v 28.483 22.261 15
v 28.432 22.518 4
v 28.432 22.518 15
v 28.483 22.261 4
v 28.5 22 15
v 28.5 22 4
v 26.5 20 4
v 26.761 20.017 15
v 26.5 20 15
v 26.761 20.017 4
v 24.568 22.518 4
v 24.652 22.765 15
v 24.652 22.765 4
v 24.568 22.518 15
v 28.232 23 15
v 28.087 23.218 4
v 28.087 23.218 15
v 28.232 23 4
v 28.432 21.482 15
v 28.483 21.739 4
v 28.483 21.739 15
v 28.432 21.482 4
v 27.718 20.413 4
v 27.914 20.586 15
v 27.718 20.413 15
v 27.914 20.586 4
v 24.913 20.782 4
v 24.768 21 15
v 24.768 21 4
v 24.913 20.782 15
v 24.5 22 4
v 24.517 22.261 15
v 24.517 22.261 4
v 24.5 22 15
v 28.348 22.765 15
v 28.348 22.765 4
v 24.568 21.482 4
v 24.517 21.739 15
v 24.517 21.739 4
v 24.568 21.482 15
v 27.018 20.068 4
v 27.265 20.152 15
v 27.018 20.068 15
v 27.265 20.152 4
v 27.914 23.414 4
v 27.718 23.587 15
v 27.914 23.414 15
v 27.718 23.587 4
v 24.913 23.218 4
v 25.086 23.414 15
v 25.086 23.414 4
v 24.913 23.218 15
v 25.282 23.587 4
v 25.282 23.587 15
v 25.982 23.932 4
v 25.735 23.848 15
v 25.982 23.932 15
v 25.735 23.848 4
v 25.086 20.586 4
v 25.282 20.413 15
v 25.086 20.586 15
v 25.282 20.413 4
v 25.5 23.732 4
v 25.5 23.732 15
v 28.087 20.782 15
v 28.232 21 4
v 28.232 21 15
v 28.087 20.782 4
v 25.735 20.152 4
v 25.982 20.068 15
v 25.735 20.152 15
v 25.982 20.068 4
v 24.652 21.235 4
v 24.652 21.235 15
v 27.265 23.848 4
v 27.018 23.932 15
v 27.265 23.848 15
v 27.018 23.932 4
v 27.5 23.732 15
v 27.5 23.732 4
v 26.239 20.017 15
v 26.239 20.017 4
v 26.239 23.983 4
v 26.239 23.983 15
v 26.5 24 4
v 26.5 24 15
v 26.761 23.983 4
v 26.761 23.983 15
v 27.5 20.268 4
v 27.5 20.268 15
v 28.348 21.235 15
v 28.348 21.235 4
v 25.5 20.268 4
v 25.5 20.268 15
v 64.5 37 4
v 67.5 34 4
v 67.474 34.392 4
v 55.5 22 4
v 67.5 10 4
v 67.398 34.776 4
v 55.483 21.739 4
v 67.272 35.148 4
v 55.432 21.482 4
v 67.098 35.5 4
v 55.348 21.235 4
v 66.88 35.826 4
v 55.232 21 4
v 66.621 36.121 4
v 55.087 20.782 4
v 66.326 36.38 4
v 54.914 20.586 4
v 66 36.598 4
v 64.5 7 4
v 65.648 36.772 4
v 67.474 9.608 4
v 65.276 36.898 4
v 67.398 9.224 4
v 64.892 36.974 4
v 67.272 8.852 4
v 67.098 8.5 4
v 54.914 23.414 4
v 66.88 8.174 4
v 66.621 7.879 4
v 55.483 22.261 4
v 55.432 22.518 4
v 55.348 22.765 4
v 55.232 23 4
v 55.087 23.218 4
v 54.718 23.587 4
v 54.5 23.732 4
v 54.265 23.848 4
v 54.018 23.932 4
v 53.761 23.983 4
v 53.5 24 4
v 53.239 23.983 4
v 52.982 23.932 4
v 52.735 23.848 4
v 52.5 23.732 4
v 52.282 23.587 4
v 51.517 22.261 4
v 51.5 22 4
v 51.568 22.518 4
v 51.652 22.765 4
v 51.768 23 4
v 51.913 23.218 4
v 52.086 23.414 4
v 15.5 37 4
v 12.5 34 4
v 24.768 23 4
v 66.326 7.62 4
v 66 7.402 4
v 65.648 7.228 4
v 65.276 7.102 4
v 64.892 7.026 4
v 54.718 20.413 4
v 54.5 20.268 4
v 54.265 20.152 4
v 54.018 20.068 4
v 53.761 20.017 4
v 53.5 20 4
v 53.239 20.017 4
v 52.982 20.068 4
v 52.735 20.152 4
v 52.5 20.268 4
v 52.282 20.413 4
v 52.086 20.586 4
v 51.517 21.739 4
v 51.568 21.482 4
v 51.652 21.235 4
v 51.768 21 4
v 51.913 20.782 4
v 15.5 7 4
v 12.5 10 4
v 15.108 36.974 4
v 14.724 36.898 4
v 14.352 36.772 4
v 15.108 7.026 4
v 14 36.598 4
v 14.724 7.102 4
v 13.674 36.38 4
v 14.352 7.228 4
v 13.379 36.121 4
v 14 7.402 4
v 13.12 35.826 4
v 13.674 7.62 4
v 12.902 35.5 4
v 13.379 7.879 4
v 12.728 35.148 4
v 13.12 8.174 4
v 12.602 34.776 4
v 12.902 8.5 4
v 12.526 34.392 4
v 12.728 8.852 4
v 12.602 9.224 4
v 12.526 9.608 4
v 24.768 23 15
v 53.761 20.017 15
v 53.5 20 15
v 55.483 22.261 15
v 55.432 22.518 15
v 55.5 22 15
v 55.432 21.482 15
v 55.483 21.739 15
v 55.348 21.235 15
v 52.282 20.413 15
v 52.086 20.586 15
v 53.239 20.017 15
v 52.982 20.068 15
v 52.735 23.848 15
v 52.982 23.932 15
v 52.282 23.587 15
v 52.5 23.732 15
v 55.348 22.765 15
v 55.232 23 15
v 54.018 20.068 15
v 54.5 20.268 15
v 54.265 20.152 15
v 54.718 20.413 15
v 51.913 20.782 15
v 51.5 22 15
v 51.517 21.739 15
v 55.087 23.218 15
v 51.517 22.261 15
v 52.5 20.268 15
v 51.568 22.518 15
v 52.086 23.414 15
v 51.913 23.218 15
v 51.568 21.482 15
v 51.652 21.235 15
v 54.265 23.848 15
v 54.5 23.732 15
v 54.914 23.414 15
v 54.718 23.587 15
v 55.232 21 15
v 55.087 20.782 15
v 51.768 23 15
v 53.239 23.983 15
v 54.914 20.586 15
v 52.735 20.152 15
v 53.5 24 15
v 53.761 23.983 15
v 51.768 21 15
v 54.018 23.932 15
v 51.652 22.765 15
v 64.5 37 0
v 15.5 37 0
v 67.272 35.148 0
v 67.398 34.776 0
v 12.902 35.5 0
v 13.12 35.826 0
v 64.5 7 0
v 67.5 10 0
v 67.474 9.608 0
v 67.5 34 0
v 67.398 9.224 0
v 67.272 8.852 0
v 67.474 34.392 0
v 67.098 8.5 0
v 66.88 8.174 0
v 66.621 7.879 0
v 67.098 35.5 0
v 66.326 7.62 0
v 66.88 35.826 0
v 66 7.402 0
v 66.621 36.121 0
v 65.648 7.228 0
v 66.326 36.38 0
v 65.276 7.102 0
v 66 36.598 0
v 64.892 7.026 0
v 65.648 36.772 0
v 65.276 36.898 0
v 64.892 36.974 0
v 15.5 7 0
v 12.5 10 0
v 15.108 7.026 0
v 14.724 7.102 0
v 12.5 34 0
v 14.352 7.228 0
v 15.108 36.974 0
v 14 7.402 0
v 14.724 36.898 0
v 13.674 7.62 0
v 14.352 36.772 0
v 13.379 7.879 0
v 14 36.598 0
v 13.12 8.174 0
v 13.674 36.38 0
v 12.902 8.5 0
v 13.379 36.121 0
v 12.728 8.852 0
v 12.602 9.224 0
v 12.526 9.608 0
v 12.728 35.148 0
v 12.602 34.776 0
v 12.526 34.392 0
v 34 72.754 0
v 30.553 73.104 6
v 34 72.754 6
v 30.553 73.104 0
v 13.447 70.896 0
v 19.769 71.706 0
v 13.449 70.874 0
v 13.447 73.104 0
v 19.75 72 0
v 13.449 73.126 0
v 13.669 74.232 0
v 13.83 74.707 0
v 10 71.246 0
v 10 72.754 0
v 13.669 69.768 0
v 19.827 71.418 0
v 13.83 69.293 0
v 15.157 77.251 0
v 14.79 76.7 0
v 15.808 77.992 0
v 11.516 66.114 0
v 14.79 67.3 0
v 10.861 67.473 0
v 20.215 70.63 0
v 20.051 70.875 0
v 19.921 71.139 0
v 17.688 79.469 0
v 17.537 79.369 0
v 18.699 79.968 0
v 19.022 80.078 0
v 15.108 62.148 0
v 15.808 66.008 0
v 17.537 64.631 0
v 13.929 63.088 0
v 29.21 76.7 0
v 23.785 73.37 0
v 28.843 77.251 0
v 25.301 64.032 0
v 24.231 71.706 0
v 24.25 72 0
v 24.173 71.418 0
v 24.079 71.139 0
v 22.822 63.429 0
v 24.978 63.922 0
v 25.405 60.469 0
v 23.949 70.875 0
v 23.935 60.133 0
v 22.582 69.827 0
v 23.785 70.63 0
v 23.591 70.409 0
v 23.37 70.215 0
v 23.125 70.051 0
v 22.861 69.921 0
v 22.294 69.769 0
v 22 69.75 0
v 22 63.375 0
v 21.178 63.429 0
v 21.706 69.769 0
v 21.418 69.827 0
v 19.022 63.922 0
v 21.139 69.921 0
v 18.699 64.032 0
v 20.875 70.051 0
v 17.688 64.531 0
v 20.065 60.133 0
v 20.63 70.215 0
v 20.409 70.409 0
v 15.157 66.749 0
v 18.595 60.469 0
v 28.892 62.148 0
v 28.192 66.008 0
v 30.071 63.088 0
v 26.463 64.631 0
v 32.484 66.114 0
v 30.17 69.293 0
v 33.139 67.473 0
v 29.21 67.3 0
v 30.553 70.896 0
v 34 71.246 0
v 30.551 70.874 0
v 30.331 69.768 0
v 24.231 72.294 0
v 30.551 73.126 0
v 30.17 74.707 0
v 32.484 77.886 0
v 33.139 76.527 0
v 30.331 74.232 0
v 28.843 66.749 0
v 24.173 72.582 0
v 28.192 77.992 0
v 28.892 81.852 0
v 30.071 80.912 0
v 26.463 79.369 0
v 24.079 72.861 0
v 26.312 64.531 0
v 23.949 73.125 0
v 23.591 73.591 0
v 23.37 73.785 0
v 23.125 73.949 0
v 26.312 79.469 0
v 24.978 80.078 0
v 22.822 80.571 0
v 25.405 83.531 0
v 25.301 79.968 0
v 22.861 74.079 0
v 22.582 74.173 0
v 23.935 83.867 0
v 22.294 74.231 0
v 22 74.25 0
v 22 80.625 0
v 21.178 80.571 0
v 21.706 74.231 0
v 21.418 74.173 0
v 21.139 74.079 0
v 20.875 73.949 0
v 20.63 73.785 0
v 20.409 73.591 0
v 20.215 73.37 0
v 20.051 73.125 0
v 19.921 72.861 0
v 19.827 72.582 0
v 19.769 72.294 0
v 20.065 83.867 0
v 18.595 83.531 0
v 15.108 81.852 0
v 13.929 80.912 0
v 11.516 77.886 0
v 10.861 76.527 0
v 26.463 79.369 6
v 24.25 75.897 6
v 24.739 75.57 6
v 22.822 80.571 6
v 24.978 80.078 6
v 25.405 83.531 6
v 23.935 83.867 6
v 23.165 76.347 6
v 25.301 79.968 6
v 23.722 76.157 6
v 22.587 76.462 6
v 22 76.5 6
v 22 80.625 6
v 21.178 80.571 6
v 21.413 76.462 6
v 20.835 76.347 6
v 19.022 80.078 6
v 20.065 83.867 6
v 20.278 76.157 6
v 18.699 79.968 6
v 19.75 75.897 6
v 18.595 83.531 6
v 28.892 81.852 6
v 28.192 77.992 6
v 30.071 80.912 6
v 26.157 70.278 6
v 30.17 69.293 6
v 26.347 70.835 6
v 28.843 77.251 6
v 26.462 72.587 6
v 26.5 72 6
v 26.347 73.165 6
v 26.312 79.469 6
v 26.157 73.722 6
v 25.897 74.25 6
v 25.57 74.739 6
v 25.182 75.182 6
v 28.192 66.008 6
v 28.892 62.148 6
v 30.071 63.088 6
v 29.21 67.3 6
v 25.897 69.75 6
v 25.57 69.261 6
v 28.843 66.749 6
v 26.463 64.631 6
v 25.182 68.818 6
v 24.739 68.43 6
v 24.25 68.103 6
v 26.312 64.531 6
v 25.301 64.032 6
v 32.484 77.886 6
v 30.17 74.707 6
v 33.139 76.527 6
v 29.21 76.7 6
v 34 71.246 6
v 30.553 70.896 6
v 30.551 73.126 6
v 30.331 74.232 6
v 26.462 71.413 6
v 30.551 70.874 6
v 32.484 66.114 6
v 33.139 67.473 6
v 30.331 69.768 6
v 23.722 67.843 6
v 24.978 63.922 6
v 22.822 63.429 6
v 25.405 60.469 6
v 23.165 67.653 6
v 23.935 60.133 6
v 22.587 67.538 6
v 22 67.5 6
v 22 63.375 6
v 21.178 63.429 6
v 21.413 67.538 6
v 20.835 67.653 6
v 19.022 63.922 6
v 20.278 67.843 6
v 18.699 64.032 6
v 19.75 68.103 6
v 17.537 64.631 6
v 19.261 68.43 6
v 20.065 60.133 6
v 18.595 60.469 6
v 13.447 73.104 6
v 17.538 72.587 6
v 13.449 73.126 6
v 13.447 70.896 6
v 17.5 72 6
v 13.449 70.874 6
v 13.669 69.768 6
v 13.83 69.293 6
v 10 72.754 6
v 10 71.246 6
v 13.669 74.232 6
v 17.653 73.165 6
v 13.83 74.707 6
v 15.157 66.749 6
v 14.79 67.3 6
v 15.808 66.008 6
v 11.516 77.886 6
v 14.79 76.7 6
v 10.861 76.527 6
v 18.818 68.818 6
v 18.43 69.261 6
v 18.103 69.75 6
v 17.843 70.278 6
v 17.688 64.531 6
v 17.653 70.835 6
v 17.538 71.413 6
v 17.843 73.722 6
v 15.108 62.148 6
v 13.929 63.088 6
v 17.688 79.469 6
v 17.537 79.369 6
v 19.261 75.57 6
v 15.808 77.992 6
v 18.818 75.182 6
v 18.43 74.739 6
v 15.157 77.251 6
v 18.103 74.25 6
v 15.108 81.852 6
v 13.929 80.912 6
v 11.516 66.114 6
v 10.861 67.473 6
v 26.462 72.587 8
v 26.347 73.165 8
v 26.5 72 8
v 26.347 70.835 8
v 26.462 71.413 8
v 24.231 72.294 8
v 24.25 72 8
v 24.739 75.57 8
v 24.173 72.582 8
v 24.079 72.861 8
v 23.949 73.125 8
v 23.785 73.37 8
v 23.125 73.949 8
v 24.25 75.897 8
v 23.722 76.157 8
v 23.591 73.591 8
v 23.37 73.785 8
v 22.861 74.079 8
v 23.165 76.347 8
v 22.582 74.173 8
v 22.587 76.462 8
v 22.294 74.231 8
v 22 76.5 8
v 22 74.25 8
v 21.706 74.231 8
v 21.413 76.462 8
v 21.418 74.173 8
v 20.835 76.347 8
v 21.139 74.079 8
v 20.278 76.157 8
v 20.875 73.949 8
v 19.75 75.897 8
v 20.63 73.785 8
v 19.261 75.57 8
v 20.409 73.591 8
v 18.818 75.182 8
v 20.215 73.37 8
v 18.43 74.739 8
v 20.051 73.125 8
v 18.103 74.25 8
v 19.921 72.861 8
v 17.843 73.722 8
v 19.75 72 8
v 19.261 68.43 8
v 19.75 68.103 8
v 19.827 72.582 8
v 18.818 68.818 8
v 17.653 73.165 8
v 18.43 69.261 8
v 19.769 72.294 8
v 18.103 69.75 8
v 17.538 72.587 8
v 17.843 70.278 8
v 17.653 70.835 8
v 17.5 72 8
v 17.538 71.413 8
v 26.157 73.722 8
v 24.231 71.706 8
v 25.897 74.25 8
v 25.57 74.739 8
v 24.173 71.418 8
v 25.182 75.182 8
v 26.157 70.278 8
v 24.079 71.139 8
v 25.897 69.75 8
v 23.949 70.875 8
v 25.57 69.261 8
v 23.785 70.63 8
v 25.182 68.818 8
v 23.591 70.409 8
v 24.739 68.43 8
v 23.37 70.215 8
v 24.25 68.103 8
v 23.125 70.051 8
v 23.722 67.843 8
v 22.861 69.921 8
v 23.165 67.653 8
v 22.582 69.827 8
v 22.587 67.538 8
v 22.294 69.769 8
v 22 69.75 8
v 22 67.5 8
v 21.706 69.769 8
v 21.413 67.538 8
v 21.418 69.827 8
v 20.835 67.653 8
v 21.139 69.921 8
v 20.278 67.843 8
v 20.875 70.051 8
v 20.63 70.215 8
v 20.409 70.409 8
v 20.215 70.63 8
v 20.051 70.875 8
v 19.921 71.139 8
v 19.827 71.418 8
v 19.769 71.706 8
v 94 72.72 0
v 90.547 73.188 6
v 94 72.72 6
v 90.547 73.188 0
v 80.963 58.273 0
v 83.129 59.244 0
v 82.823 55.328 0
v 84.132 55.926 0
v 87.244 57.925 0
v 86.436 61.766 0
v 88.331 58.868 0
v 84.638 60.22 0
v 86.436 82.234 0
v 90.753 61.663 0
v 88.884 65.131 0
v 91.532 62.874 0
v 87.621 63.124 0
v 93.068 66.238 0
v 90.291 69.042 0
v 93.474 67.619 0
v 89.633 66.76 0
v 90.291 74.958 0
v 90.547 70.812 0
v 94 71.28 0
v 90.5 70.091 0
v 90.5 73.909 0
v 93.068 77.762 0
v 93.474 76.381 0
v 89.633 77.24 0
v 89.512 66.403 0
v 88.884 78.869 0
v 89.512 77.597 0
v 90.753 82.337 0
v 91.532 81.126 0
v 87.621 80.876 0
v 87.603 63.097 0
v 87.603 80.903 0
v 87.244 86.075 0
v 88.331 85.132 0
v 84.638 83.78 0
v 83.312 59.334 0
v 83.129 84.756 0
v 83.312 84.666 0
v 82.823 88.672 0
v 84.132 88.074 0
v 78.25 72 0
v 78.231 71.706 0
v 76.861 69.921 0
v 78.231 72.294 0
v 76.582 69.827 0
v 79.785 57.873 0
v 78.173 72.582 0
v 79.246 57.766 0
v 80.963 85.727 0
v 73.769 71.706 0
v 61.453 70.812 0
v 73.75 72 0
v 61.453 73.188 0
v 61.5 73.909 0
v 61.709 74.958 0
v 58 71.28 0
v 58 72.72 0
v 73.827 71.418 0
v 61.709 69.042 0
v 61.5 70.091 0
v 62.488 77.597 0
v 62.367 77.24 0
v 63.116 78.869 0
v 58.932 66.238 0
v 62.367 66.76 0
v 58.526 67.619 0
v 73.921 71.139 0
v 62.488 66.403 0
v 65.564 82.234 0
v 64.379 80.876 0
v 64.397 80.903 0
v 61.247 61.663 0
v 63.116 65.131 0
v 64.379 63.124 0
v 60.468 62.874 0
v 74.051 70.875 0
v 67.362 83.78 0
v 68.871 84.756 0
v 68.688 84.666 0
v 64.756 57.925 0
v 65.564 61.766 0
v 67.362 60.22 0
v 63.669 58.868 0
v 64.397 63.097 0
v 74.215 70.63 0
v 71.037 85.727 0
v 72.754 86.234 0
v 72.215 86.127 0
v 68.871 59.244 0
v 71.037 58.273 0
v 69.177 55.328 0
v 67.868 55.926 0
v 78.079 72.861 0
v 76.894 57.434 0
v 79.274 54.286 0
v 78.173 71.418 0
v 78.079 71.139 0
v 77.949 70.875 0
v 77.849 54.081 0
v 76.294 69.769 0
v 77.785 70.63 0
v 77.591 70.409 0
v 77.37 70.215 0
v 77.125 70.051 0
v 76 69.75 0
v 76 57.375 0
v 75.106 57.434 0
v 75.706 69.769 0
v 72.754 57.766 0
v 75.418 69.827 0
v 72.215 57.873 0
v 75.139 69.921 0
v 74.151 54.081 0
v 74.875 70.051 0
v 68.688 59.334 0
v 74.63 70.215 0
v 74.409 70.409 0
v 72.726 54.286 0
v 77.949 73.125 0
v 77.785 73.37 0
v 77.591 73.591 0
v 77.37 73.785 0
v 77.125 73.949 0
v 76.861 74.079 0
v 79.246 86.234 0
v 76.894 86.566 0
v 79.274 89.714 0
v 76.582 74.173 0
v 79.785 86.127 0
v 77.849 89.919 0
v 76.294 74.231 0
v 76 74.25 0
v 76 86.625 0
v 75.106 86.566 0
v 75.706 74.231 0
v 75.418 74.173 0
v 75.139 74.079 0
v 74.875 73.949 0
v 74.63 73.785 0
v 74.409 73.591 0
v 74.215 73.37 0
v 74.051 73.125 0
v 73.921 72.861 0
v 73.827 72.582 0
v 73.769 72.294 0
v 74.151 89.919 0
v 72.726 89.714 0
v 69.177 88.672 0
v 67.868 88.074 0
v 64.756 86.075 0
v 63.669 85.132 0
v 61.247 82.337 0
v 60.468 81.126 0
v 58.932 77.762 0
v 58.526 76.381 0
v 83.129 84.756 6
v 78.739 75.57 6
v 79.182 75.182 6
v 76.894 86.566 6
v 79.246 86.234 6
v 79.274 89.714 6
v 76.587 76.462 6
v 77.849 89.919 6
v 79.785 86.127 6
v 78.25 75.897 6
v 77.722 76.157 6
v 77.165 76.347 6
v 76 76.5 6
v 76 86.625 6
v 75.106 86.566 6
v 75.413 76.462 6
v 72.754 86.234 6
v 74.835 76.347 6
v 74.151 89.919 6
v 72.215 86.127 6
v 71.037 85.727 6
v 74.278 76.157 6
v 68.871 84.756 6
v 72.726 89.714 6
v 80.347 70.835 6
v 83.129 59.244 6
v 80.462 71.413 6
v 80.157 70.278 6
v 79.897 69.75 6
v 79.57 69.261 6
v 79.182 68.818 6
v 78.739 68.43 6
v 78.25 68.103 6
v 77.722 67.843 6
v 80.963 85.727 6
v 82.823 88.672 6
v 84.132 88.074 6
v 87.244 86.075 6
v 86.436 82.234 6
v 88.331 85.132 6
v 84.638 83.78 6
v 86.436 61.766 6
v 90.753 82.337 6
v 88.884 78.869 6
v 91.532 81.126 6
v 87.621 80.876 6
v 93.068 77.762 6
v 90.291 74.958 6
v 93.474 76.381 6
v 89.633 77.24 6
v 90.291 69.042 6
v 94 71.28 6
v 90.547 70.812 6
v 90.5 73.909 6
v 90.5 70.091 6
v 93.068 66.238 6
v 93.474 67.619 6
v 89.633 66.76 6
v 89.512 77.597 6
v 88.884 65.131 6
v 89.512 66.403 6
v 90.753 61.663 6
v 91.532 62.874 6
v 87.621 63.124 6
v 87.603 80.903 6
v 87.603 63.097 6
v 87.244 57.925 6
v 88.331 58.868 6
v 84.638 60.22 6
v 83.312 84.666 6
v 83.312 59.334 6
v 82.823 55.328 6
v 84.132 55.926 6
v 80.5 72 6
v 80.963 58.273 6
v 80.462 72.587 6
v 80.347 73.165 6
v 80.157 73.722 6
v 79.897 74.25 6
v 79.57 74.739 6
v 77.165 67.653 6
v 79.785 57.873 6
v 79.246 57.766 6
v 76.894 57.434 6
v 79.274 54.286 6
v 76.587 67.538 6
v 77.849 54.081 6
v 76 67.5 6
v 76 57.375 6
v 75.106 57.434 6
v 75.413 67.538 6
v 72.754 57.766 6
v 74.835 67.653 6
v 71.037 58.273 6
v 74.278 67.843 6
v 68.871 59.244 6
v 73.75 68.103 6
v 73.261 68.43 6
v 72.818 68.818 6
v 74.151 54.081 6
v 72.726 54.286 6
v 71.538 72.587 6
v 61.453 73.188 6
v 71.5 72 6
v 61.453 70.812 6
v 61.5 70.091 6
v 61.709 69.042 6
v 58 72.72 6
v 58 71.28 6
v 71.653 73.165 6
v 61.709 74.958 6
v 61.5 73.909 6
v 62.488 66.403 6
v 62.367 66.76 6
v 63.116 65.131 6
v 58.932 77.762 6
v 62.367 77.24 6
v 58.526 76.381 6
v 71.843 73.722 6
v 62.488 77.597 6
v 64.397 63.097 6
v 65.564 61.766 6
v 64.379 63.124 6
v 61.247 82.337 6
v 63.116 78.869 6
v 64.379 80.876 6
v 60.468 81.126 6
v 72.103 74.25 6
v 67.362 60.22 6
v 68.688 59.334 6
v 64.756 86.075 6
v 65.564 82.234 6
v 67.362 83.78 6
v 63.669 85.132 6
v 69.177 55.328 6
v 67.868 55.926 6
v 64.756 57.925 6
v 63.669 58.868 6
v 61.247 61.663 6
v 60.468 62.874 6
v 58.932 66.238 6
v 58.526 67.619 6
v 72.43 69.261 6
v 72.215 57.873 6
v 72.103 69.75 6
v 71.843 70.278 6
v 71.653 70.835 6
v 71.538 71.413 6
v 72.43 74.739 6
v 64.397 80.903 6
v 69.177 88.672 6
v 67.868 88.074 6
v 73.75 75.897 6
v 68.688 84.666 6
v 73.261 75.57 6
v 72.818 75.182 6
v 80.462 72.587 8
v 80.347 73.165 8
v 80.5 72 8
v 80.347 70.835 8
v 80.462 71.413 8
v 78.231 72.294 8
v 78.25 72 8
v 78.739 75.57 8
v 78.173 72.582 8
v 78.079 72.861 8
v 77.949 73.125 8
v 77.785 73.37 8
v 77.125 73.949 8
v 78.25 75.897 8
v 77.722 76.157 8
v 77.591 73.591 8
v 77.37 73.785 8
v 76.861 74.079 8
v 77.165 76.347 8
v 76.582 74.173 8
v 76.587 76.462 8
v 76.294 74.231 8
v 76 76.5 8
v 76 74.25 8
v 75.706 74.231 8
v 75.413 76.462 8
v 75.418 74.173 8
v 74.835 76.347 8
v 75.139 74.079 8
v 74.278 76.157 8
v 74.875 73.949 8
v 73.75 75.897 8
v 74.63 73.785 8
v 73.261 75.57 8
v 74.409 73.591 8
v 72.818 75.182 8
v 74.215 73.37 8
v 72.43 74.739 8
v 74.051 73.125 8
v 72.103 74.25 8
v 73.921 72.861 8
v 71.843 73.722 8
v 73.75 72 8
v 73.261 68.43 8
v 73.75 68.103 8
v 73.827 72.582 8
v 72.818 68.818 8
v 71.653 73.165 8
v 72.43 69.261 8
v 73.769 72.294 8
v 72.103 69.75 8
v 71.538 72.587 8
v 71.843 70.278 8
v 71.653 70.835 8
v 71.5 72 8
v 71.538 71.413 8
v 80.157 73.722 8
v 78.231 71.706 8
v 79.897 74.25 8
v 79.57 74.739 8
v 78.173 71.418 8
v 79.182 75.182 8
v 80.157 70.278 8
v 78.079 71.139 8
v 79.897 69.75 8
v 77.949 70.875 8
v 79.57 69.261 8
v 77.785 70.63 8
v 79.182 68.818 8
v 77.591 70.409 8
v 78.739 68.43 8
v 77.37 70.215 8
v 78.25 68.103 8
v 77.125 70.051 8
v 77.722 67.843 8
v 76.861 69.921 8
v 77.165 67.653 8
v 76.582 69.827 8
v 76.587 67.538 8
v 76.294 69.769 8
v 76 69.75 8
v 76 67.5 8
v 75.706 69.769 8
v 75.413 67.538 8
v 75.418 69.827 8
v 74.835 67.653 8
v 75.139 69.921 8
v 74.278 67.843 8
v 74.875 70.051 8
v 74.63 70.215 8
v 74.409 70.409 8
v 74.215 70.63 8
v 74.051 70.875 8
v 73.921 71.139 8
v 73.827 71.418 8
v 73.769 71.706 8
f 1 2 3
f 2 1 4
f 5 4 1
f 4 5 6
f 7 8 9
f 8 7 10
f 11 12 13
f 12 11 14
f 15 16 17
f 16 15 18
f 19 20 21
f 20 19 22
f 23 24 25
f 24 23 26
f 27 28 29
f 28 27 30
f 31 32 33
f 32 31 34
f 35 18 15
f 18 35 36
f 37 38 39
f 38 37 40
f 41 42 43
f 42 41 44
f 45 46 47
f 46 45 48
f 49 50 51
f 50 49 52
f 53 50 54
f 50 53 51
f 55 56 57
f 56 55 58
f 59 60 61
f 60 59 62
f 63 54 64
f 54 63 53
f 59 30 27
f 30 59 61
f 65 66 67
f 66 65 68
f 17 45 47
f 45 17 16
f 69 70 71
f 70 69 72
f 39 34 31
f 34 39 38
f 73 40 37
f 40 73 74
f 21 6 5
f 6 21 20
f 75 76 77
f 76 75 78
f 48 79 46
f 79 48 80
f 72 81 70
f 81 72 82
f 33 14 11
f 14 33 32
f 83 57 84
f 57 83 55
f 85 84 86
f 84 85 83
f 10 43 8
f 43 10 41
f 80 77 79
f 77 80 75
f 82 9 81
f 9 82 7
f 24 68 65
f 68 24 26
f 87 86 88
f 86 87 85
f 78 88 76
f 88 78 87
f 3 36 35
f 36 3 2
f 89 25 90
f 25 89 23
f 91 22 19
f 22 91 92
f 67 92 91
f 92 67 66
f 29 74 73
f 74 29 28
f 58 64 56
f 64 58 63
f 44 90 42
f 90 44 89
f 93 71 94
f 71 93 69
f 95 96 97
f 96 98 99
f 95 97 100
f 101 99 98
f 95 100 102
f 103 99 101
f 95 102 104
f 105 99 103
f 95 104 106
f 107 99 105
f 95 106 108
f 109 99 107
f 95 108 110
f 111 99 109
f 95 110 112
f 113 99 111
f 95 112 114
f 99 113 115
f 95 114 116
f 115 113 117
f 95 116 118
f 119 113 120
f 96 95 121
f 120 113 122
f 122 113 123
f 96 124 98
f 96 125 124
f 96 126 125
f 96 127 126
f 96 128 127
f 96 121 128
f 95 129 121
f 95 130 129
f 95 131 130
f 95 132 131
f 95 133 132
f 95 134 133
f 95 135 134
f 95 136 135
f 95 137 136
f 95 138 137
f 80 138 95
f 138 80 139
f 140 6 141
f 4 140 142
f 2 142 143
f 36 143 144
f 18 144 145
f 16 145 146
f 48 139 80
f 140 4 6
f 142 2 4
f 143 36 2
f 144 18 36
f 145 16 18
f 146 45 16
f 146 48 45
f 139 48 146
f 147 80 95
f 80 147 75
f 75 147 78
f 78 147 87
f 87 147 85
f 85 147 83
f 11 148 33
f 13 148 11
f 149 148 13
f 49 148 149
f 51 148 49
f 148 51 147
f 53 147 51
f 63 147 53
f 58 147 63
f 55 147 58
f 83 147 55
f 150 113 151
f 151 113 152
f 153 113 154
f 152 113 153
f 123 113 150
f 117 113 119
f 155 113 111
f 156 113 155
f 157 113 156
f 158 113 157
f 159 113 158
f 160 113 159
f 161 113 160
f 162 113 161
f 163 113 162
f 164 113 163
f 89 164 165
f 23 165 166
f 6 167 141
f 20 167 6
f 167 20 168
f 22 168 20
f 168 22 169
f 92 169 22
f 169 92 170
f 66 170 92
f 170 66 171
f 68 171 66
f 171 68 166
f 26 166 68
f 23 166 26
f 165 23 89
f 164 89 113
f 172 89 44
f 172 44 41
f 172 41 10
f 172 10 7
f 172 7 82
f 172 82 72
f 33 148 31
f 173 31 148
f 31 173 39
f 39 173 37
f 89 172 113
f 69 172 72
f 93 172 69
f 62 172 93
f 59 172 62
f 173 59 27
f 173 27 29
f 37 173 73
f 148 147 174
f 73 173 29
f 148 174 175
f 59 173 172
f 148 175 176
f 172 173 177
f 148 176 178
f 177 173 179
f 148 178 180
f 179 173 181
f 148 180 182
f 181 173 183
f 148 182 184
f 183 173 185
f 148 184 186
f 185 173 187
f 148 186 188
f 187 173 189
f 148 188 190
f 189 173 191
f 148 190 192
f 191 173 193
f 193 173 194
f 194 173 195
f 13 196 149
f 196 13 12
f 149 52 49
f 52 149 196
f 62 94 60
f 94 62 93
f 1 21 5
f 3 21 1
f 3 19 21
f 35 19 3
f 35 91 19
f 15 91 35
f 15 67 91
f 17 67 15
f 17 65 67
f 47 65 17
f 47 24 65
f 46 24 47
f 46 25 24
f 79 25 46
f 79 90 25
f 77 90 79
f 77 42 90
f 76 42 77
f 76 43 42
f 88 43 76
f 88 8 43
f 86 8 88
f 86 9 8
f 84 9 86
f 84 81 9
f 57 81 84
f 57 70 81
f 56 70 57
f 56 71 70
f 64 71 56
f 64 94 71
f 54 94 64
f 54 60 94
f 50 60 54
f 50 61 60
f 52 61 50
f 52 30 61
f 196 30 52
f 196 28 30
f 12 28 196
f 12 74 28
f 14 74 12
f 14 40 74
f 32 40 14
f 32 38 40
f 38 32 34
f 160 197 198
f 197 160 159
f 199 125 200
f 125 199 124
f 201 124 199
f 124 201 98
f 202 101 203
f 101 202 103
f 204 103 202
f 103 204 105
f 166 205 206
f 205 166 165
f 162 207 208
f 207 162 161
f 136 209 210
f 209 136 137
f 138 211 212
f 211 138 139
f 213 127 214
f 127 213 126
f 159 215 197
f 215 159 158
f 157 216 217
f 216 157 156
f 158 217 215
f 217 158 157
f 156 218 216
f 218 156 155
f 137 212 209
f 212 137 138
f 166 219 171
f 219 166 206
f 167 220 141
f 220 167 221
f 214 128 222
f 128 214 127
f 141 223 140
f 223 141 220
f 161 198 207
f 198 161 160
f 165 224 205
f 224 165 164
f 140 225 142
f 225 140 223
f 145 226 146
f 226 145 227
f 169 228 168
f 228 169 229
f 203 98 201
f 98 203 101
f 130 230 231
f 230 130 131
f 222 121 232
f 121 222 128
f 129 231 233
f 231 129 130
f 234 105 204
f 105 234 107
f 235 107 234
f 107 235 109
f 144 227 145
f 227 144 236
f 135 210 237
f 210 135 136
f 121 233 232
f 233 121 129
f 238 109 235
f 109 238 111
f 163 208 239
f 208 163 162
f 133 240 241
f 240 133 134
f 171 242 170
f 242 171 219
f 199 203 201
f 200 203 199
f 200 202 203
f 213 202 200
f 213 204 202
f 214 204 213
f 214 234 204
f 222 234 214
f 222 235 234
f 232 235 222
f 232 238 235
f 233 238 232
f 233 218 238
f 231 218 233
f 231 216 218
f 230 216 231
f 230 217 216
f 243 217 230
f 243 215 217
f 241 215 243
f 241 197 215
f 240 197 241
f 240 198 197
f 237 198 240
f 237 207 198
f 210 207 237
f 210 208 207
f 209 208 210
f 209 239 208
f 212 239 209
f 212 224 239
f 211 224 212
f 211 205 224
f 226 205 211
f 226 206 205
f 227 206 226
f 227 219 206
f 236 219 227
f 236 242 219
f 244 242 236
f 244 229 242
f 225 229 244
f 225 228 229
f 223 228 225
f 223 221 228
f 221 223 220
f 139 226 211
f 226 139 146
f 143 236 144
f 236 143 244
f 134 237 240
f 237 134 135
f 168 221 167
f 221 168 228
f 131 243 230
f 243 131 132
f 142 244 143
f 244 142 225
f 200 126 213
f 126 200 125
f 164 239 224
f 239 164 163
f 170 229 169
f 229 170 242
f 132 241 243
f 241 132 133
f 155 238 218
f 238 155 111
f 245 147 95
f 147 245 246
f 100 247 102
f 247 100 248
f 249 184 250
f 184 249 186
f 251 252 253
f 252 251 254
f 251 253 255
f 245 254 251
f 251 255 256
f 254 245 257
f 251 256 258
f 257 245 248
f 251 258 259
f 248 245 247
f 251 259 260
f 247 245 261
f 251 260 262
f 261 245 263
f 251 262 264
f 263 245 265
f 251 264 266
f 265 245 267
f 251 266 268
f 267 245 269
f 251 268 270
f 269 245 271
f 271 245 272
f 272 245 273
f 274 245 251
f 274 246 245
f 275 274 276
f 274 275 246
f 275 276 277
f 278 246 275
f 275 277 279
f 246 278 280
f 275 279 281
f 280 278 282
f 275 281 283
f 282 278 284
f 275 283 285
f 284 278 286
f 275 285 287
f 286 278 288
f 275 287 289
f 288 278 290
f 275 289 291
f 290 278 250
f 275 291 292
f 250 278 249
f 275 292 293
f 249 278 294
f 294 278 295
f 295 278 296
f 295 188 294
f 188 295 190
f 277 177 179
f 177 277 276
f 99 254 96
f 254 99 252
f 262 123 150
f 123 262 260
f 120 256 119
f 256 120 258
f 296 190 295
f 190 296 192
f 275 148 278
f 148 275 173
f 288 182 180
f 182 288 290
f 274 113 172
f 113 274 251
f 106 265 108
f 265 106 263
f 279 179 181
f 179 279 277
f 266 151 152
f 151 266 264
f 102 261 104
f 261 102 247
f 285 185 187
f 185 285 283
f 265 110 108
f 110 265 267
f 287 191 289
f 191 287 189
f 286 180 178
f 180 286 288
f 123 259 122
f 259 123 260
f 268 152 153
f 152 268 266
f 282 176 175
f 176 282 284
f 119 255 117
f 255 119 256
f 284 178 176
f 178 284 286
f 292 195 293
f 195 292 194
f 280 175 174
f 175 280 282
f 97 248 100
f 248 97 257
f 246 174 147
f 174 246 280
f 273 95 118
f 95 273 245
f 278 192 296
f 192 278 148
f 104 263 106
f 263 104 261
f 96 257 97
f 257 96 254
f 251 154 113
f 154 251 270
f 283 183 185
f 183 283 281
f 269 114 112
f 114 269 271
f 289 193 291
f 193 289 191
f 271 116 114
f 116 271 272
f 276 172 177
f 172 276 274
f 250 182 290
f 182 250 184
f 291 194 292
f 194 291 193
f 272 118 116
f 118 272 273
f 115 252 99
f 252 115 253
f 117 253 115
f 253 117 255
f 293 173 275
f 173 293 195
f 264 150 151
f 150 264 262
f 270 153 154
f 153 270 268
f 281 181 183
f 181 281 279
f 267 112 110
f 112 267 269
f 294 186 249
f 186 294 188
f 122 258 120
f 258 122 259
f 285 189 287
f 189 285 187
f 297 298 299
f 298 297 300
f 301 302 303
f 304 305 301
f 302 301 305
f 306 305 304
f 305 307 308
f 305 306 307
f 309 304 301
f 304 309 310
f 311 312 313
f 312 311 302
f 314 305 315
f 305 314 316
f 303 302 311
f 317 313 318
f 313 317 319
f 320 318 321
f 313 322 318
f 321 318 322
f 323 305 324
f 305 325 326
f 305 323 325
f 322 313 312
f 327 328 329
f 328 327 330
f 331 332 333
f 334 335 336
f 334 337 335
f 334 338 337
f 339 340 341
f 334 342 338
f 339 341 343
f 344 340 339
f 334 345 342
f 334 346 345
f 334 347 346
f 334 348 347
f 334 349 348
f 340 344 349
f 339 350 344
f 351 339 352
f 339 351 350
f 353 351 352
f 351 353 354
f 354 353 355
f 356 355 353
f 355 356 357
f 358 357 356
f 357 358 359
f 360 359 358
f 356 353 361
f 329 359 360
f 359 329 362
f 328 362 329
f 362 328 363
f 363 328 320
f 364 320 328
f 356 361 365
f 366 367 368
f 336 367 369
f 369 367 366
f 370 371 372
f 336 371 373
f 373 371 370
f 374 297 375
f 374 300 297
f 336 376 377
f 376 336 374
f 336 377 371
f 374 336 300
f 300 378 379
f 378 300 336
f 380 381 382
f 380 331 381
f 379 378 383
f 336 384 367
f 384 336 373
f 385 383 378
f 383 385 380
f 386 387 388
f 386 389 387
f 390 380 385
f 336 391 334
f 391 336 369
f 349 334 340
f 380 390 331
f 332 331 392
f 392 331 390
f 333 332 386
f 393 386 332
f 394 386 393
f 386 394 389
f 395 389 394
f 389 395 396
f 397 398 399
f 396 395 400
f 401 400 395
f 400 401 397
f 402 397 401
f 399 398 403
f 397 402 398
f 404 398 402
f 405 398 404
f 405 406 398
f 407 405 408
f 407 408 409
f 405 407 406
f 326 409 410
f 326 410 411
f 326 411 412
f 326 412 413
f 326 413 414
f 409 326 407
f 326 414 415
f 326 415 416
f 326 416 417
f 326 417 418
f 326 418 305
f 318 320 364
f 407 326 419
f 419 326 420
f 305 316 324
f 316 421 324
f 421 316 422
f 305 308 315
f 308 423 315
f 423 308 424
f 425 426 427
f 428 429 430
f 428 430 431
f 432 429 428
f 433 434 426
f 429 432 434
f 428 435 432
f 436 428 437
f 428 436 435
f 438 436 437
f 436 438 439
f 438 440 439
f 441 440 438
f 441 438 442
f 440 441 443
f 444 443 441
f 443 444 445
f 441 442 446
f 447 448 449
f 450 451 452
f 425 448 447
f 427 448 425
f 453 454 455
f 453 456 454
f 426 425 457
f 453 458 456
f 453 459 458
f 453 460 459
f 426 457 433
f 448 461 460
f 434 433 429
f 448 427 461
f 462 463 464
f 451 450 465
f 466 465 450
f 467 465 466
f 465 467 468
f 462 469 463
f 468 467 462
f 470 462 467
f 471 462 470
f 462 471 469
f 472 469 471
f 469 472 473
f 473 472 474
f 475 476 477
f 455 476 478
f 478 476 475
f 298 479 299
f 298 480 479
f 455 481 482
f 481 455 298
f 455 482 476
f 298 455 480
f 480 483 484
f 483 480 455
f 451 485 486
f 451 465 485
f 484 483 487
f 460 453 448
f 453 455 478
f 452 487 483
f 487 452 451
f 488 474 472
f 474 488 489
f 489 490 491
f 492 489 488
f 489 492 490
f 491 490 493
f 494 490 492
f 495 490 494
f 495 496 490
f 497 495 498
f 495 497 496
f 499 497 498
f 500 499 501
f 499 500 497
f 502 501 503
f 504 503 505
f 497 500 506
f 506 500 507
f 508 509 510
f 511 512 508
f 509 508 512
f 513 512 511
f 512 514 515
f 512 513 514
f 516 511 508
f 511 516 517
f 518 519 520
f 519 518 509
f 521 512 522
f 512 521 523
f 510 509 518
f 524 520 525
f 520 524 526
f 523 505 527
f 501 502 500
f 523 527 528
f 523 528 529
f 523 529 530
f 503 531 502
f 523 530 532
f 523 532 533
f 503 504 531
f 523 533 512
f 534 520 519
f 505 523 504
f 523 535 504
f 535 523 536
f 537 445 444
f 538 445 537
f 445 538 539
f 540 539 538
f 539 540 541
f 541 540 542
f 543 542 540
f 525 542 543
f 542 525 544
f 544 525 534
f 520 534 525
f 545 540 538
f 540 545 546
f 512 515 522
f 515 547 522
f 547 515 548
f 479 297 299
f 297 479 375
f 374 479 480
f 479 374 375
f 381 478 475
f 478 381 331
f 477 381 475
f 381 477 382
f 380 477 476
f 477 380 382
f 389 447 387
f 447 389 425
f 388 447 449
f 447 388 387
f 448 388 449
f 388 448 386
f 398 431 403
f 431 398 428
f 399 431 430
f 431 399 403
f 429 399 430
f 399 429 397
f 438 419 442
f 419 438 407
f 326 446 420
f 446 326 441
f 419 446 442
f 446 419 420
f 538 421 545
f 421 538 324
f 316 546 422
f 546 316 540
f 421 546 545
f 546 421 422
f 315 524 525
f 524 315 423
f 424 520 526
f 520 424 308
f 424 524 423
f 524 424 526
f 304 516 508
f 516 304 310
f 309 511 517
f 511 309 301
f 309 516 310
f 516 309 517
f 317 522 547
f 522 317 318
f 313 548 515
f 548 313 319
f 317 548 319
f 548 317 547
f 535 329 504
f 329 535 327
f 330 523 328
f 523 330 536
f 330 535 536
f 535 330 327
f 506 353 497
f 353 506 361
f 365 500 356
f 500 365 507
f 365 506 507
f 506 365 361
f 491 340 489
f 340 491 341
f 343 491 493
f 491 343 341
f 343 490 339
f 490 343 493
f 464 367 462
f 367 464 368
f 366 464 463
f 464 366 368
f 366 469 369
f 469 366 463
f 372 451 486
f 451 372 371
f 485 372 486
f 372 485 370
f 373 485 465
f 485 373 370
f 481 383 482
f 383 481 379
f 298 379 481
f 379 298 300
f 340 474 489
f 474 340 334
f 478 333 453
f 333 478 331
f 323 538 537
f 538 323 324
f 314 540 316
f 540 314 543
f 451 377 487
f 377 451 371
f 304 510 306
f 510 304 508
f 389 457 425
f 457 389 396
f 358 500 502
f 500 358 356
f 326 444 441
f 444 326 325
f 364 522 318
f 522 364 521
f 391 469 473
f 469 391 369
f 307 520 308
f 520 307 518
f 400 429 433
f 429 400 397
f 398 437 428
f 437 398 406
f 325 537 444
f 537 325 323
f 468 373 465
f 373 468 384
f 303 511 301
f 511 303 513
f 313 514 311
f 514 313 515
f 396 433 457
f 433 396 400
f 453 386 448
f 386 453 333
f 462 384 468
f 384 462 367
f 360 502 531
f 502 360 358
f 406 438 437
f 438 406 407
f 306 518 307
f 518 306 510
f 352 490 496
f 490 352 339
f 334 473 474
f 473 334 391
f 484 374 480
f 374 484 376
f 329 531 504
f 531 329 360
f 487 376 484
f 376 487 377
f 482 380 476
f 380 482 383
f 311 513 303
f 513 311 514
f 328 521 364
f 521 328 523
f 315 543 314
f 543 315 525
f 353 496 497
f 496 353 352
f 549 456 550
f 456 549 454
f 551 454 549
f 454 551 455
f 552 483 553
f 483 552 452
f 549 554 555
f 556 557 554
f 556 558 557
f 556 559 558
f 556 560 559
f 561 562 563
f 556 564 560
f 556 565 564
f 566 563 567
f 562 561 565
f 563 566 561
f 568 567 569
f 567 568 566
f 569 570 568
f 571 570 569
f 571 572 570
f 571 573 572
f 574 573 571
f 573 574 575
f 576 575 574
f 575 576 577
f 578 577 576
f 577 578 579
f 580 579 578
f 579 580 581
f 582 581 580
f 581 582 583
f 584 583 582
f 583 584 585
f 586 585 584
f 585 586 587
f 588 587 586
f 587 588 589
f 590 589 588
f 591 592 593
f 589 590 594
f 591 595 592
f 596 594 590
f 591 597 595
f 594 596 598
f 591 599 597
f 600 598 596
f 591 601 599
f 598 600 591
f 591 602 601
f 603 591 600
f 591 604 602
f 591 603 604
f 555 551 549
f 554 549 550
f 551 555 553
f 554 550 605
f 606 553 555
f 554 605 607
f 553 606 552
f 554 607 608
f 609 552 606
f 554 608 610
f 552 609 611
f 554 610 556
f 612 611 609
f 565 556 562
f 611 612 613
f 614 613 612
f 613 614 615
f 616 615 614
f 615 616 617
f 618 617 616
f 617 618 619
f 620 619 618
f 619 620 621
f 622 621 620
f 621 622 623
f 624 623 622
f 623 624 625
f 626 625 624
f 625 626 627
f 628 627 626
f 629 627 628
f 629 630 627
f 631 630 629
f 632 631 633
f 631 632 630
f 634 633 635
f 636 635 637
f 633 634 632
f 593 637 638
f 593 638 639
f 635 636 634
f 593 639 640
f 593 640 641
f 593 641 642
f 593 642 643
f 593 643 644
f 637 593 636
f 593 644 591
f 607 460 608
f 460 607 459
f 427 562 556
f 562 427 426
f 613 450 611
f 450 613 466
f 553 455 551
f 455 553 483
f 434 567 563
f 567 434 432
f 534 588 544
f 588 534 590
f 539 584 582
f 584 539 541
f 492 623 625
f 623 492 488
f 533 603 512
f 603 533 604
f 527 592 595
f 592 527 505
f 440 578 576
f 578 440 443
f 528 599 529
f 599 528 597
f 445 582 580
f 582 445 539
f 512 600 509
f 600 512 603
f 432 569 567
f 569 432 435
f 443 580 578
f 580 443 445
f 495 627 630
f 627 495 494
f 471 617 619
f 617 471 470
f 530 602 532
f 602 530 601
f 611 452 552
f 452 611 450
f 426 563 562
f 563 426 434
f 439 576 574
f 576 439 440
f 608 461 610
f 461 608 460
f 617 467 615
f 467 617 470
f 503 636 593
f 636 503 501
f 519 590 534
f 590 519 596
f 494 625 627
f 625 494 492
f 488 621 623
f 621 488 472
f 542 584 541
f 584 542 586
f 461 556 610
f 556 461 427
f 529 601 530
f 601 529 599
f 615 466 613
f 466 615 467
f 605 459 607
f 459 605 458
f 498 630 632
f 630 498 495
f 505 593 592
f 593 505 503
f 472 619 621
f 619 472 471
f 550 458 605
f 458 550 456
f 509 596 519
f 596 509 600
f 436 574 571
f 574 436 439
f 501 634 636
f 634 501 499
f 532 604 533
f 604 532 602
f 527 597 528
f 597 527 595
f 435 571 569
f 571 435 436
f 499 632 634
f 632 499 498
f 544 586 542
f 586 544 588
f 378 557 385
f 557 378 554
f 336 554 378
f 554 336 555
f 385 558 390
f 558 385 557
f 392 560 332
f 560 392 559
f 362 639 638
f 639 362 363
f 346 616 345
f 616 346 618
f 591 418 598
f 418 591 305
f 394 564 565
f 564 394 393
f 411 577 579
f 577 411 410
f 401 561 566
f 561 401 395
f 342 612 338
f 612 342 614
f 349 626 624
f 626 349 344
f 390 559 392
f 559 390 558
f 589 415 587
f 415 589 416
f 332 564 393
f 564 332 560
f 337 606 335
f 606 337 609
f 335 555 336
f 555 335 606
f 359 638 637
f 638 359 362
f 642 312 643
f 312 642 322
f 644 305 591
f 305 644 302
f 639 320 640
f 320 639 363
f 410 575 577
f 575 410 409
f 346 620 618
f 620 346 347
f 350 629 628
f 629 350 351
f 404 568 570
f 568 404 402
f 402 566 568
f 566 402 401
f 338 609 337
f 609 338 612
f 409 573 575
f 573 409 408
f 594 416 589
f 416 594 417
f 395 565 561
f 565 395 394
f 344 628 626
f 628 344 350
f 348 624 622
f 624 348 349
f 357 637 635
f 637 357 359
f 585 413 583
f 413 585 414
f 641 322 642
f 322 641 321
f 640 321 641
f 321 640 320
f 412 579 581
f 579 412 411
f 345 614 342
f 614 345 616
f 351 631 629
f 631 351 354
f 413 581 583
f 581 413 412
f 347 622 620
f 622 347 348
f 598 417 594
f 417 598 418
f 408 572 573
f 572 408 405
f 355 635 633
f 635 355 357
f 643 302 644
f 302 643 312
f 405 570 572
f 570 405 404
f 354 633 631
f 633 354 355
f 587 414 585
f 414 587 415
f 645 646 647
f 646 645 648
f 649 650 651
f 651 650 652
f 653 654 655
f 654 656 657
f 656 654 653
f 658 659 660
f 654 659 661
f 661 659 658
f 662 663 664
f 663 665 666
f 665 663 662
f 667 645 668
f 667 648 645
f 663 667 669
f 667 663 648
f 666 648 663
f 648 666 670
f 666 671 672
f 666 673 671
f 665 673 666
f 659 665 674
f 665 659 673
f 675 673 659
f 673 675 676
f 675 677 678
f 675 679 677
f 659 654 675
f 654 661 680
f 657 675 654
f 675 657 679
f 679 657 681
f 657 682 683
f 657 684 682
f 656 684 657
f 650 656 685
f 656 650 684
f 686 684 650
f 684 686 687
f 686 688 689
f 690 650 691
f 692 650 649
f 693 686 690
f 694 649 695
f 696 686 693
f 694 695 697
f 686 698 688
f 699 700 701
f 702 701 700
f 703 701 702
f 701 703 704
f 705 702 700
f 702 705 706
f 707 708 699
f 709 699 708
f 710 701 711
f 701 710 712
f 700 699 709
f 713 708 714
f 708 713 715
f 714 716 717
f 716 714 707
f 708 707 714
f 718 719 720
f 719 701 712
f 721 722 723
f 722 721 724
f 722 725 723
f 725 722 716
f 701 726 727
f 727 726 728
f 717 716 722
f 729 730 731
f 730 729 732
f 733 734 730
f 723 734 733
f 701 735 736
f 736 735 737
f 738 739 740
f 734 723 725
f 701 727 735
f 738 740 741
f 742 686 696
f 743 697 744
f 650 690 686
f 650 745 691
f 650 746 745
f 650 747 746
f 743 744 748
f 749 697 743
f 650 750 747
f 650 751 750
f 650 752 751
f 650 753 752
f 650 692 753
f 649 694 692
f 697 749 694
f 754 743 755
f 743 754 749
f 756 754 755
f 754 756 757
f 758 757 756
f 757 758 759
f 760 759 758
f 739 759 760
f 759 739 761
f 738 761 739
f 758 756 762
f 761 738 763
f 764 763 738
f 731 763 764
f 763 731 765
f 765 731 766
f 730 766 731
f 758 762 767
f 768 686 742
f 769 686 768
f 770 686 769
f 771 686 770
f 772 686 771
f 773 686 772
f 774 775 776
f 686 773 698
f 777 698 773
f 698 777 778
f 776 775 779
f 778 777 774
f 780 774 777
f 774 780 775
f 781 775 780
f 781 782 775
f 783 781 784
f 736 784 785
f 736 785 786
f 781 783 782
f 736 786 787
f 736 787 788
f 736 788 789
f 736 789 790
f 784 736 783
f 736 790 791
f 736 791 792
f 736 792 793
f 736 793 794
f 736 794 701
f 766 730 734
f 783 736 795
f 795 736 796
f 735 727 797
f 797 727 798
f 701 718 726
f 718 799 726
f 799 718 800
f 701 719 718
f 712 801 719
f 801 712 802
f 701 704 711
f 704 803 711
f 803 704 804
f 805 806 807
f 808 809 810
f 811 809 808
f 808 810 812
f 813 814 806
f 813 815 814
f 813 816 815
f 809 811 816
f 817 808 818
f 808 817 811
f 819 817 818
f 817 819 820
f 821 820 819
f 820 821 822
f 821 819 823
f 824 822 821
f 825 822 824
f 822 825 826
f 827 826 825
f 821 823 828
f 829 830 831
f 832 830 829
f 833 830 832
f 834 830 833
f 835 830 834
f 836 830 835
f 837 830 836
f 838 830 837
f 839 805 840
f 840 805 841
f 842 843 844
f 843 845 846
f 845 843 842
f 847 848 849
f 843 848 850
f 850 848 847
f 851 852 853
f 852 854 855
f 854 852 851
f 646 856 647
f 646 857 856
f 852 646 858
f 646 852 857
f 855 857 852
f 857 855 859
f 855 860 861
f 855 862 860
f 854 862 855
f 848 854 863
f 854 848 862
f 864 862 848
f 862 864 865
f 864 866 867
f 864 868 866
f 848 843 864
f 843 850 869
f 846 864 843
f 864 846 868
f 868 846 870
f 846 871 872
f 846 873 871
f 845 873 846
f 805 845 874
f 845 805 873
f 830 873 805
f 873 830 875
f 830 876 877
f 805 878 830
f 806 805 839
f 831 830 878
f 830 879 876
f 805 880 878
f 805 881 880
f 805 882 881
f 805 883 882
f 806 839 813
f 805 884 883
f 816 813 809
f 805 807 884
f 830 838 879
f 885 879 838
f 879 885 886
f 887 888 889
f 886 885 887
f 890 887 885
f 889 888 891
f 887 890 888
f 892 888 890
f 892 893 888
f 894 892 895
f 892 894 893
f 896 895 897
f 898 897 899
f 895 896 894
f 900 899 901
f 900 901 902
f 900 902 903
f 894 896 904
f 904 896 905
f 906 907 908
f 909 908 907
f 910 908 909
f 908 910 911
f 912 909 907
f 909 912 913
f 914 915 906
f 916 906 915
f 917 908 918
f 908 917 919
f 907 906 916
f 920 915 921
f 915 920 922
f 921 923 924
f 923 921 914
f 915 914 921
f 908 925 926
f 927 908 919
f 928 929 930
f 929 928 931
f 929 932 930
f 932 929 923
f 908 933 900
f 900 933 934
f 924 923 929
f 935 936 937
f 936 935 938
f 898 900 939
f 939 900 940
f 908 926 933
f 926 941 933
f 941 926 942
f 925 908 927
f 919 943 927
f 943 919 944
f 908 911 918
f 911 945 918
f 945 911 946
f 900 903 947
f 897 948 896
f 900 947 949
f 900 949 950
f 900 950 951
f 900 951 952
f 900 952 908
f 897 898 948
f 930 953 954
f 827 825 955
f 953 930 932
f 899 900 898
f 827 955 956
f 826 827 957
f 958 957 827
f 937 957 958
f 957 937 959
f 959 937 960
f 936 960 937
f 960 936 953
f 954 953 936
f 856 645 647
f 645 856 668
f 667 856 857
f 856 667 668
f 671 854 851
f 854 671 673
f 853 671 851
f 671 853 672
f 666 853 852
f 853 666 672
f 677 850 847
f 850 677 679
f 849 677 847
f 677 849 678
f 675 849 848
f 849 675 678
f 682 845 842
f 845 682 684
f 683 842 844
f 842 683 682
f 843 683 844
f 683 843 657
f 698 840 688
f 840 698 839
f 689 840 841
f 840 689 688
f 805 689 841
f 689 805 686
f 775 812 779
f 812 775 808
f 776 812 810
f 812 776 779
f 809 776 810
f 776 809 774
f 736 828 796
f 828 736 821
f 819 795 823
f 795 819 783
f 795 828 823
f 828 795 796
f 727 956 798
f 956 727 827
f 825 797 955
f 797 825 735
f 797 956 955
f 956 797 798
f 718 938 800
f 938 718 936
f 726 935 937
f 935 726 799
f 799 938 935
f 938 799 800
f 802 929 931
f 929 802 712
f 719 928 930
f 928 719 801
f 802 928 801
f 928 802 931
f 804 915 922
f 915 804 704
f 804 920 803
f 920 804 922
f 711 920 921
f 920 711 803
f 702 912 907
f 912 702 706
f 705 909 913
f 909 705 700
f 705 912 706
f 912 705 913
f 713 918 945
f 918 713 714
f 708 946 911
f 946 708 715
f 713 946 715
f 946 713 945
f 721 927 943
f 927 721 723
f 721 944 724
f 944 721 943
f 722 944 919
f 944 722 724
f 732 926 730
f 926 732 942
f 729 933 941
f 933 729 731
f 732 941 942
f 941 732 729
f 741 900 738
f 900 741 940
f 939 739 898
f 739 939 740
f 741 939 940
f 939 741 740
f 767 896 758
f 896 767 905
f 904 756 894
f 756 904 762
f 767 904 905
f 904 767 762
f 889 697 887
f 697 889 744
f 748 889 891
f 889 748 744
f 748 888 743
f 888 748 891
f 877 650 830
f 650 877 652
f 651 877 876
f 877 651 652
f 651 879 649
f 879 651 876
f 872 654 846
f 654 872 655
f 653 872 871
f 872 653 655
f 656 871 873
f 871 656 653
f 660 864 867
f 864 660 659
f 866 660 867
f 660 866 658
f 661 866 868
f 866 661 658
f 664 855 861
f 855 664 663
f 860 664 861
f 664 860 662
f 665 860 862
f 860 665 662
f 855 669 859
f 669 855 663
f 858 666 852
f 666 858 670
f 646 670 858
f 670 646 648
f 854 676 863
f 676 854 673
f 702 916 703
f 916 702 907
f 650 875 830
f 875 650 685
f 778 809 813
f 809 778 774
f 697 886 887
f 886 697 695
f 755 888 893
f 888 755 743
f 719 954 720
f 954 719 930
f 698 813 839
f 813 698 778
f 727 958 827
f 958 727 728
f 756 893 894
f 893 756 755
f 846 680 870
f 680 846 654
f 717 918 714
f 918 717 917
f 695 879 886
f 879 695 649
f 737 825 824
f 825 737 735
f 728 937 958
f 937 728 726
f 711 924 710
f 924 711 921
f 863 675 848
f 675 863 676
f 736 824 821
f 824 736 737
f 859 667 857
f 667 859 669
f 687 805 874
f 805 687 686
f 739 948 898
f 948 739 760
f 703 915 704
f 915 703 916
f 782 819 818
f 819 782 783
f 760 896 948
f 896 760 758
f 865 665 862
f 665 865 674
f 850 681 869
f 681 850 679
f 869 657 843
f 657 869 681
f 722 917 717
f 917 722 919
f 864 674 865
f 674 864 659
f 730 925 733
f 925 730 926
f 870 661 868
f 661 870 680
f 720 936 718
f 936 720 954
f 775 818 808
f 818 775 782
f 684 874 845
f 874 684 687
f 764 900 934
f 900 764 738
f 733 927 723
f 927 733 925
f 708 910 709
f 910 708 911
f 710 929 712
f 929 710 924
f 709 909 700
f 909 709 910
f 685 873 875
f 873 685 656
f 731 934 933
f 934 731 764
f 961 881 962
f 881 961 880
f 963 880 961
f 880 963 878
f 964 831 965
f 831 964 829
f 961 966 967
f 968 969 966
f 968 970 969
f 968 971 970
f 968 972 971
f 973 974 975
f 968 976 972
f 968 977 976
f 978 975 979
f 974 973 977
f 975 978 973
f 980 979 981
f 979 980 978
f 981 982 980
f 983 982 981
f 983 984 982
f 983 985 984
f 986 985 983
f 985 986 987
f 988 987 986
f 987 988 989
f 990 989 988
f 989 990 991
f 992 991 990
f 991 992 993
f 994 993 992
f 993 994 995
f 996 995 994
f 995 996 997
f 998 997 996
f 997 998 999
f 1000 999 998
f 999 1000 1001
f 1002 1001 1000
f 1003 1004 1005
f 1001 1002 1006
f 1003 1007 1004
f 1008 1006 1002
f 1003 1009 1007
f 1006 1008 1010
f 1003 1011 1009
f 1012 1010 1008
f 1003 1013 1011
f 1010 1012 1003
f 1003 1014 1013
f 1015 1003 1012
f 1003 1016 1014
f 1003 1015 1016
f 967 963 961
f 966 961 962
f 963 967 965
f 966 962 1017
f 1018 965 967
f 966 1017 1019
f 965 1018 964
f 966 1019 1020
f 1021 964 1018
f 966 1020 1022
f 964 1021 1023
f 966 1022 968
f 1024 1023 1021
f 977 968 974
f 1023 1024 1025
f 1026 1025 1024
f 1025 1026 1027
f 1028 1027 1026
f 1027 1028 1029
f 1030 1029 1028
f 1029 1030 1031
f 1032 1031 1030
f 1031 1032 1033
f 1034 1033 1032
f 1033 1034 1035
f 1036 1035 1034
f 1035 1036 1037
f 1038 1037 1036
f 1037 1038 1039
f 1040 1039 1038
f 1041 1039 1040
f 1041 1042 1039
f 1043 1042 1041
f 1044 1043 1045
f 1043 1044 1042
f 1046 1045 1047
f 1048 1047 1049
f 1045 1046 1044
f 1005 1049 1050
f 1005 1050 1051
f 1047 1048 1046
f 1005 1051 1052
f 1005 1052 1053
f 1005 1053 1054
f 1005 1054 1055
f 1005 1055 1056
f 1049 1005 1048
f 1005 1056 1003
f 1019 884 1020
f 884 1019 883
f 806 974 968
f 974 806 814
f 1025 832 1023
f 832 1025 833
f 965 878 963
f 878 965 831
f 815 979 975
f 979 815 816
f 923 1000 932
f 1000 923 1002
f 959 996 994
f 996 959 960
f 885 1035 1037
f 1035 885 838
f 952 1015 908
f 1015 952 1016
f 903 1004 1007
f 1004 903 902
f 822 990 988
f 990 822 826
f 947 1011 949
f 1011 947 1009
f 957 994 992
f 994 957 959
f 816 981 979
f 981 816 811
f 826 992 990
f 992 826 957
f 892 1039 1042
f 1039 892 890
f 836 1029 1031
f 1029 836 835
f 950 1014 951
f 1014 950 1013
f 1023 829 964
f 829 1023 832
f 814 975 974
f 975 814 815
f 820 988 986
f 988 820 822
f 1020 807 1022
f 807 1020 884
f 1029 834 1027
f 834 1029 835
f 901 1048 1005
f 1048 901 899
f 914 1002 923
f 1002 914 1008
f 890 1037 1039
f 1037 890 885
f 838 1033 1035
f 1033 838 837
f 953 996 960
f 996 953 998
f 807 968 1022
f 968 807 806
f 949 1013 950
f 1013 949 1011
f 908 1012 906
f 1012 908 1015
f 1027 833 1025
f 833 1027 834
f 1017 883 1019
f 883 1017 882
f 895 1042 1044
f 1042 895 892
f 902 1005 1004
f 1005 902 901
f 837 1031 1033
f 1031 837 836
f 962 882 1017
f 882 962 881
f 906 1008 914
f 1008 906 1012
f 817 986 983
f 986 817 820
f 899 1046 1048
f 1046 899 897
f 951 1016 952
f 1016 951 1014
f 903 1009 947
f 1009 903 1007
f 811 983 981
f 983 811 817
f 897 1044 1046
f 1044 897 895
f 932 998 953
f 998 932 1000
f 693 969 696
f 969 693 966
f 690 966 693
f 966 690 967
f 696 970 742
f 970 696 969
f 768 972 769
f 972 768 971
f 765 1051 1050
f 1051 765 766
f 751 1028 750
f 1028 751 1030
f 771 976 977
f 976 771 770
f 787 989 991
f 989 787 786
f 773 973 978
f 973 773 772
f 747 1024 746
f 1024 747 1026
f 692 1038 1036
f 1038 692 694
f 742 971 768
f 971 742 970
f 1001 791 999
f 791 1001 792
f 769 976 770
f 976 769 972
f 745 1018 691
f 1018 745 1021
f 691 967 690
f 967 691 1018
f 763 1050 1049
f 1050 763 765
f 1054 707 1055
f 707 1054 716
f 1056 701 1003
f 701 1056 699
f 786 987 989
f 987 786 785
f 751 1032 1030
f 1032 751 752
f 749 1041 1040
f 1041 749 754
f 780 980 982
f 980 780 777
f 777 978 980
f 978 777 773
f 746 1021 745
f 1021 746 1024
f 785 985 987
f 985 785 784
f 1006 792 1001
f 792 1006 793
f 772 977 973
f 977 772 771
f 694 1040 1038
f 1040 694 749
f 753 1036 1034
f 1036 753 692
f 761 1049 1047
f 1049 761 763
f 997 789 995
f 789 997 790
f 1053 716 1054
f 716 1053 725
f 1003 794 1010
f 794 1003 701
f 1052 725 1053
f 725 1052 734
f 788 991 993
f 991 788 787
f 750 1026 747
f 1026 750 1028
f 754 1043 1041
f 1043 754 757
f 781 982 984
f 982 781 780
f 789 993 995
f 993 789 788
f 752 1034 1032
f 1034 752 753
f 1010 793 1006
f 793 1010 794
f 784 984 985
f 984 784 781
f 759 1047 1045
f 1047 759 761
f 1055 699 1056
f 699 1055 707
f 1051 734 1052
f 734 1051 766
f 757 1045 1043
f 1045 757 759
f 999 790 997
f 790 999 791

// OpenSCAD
/*
Sample 102: Stirnradpaar auf Stiftbasis — 14:22
Generated from the FDM Mechanical Sample Library.
Units: millimetres.

Override examples:
  openscad -o custom.stl -D 'view="plate"' -D 'render_fn=64' model.scad
  openscad -o preview.png -D 'view="assembly"' model.scad
*/
use <../../../library/fdm_mechanisms.scad>

render_fn = is_undef(render_fn) ? 48 : render_fn;
view = is_undef(view) ? "plate" : view;
$fn = render_fn;

sample_spur_gears(
    view=view,
    teeth_a=14,
    teeth_b=22,
    module_size=1.5,
    clearance=0.25
);
